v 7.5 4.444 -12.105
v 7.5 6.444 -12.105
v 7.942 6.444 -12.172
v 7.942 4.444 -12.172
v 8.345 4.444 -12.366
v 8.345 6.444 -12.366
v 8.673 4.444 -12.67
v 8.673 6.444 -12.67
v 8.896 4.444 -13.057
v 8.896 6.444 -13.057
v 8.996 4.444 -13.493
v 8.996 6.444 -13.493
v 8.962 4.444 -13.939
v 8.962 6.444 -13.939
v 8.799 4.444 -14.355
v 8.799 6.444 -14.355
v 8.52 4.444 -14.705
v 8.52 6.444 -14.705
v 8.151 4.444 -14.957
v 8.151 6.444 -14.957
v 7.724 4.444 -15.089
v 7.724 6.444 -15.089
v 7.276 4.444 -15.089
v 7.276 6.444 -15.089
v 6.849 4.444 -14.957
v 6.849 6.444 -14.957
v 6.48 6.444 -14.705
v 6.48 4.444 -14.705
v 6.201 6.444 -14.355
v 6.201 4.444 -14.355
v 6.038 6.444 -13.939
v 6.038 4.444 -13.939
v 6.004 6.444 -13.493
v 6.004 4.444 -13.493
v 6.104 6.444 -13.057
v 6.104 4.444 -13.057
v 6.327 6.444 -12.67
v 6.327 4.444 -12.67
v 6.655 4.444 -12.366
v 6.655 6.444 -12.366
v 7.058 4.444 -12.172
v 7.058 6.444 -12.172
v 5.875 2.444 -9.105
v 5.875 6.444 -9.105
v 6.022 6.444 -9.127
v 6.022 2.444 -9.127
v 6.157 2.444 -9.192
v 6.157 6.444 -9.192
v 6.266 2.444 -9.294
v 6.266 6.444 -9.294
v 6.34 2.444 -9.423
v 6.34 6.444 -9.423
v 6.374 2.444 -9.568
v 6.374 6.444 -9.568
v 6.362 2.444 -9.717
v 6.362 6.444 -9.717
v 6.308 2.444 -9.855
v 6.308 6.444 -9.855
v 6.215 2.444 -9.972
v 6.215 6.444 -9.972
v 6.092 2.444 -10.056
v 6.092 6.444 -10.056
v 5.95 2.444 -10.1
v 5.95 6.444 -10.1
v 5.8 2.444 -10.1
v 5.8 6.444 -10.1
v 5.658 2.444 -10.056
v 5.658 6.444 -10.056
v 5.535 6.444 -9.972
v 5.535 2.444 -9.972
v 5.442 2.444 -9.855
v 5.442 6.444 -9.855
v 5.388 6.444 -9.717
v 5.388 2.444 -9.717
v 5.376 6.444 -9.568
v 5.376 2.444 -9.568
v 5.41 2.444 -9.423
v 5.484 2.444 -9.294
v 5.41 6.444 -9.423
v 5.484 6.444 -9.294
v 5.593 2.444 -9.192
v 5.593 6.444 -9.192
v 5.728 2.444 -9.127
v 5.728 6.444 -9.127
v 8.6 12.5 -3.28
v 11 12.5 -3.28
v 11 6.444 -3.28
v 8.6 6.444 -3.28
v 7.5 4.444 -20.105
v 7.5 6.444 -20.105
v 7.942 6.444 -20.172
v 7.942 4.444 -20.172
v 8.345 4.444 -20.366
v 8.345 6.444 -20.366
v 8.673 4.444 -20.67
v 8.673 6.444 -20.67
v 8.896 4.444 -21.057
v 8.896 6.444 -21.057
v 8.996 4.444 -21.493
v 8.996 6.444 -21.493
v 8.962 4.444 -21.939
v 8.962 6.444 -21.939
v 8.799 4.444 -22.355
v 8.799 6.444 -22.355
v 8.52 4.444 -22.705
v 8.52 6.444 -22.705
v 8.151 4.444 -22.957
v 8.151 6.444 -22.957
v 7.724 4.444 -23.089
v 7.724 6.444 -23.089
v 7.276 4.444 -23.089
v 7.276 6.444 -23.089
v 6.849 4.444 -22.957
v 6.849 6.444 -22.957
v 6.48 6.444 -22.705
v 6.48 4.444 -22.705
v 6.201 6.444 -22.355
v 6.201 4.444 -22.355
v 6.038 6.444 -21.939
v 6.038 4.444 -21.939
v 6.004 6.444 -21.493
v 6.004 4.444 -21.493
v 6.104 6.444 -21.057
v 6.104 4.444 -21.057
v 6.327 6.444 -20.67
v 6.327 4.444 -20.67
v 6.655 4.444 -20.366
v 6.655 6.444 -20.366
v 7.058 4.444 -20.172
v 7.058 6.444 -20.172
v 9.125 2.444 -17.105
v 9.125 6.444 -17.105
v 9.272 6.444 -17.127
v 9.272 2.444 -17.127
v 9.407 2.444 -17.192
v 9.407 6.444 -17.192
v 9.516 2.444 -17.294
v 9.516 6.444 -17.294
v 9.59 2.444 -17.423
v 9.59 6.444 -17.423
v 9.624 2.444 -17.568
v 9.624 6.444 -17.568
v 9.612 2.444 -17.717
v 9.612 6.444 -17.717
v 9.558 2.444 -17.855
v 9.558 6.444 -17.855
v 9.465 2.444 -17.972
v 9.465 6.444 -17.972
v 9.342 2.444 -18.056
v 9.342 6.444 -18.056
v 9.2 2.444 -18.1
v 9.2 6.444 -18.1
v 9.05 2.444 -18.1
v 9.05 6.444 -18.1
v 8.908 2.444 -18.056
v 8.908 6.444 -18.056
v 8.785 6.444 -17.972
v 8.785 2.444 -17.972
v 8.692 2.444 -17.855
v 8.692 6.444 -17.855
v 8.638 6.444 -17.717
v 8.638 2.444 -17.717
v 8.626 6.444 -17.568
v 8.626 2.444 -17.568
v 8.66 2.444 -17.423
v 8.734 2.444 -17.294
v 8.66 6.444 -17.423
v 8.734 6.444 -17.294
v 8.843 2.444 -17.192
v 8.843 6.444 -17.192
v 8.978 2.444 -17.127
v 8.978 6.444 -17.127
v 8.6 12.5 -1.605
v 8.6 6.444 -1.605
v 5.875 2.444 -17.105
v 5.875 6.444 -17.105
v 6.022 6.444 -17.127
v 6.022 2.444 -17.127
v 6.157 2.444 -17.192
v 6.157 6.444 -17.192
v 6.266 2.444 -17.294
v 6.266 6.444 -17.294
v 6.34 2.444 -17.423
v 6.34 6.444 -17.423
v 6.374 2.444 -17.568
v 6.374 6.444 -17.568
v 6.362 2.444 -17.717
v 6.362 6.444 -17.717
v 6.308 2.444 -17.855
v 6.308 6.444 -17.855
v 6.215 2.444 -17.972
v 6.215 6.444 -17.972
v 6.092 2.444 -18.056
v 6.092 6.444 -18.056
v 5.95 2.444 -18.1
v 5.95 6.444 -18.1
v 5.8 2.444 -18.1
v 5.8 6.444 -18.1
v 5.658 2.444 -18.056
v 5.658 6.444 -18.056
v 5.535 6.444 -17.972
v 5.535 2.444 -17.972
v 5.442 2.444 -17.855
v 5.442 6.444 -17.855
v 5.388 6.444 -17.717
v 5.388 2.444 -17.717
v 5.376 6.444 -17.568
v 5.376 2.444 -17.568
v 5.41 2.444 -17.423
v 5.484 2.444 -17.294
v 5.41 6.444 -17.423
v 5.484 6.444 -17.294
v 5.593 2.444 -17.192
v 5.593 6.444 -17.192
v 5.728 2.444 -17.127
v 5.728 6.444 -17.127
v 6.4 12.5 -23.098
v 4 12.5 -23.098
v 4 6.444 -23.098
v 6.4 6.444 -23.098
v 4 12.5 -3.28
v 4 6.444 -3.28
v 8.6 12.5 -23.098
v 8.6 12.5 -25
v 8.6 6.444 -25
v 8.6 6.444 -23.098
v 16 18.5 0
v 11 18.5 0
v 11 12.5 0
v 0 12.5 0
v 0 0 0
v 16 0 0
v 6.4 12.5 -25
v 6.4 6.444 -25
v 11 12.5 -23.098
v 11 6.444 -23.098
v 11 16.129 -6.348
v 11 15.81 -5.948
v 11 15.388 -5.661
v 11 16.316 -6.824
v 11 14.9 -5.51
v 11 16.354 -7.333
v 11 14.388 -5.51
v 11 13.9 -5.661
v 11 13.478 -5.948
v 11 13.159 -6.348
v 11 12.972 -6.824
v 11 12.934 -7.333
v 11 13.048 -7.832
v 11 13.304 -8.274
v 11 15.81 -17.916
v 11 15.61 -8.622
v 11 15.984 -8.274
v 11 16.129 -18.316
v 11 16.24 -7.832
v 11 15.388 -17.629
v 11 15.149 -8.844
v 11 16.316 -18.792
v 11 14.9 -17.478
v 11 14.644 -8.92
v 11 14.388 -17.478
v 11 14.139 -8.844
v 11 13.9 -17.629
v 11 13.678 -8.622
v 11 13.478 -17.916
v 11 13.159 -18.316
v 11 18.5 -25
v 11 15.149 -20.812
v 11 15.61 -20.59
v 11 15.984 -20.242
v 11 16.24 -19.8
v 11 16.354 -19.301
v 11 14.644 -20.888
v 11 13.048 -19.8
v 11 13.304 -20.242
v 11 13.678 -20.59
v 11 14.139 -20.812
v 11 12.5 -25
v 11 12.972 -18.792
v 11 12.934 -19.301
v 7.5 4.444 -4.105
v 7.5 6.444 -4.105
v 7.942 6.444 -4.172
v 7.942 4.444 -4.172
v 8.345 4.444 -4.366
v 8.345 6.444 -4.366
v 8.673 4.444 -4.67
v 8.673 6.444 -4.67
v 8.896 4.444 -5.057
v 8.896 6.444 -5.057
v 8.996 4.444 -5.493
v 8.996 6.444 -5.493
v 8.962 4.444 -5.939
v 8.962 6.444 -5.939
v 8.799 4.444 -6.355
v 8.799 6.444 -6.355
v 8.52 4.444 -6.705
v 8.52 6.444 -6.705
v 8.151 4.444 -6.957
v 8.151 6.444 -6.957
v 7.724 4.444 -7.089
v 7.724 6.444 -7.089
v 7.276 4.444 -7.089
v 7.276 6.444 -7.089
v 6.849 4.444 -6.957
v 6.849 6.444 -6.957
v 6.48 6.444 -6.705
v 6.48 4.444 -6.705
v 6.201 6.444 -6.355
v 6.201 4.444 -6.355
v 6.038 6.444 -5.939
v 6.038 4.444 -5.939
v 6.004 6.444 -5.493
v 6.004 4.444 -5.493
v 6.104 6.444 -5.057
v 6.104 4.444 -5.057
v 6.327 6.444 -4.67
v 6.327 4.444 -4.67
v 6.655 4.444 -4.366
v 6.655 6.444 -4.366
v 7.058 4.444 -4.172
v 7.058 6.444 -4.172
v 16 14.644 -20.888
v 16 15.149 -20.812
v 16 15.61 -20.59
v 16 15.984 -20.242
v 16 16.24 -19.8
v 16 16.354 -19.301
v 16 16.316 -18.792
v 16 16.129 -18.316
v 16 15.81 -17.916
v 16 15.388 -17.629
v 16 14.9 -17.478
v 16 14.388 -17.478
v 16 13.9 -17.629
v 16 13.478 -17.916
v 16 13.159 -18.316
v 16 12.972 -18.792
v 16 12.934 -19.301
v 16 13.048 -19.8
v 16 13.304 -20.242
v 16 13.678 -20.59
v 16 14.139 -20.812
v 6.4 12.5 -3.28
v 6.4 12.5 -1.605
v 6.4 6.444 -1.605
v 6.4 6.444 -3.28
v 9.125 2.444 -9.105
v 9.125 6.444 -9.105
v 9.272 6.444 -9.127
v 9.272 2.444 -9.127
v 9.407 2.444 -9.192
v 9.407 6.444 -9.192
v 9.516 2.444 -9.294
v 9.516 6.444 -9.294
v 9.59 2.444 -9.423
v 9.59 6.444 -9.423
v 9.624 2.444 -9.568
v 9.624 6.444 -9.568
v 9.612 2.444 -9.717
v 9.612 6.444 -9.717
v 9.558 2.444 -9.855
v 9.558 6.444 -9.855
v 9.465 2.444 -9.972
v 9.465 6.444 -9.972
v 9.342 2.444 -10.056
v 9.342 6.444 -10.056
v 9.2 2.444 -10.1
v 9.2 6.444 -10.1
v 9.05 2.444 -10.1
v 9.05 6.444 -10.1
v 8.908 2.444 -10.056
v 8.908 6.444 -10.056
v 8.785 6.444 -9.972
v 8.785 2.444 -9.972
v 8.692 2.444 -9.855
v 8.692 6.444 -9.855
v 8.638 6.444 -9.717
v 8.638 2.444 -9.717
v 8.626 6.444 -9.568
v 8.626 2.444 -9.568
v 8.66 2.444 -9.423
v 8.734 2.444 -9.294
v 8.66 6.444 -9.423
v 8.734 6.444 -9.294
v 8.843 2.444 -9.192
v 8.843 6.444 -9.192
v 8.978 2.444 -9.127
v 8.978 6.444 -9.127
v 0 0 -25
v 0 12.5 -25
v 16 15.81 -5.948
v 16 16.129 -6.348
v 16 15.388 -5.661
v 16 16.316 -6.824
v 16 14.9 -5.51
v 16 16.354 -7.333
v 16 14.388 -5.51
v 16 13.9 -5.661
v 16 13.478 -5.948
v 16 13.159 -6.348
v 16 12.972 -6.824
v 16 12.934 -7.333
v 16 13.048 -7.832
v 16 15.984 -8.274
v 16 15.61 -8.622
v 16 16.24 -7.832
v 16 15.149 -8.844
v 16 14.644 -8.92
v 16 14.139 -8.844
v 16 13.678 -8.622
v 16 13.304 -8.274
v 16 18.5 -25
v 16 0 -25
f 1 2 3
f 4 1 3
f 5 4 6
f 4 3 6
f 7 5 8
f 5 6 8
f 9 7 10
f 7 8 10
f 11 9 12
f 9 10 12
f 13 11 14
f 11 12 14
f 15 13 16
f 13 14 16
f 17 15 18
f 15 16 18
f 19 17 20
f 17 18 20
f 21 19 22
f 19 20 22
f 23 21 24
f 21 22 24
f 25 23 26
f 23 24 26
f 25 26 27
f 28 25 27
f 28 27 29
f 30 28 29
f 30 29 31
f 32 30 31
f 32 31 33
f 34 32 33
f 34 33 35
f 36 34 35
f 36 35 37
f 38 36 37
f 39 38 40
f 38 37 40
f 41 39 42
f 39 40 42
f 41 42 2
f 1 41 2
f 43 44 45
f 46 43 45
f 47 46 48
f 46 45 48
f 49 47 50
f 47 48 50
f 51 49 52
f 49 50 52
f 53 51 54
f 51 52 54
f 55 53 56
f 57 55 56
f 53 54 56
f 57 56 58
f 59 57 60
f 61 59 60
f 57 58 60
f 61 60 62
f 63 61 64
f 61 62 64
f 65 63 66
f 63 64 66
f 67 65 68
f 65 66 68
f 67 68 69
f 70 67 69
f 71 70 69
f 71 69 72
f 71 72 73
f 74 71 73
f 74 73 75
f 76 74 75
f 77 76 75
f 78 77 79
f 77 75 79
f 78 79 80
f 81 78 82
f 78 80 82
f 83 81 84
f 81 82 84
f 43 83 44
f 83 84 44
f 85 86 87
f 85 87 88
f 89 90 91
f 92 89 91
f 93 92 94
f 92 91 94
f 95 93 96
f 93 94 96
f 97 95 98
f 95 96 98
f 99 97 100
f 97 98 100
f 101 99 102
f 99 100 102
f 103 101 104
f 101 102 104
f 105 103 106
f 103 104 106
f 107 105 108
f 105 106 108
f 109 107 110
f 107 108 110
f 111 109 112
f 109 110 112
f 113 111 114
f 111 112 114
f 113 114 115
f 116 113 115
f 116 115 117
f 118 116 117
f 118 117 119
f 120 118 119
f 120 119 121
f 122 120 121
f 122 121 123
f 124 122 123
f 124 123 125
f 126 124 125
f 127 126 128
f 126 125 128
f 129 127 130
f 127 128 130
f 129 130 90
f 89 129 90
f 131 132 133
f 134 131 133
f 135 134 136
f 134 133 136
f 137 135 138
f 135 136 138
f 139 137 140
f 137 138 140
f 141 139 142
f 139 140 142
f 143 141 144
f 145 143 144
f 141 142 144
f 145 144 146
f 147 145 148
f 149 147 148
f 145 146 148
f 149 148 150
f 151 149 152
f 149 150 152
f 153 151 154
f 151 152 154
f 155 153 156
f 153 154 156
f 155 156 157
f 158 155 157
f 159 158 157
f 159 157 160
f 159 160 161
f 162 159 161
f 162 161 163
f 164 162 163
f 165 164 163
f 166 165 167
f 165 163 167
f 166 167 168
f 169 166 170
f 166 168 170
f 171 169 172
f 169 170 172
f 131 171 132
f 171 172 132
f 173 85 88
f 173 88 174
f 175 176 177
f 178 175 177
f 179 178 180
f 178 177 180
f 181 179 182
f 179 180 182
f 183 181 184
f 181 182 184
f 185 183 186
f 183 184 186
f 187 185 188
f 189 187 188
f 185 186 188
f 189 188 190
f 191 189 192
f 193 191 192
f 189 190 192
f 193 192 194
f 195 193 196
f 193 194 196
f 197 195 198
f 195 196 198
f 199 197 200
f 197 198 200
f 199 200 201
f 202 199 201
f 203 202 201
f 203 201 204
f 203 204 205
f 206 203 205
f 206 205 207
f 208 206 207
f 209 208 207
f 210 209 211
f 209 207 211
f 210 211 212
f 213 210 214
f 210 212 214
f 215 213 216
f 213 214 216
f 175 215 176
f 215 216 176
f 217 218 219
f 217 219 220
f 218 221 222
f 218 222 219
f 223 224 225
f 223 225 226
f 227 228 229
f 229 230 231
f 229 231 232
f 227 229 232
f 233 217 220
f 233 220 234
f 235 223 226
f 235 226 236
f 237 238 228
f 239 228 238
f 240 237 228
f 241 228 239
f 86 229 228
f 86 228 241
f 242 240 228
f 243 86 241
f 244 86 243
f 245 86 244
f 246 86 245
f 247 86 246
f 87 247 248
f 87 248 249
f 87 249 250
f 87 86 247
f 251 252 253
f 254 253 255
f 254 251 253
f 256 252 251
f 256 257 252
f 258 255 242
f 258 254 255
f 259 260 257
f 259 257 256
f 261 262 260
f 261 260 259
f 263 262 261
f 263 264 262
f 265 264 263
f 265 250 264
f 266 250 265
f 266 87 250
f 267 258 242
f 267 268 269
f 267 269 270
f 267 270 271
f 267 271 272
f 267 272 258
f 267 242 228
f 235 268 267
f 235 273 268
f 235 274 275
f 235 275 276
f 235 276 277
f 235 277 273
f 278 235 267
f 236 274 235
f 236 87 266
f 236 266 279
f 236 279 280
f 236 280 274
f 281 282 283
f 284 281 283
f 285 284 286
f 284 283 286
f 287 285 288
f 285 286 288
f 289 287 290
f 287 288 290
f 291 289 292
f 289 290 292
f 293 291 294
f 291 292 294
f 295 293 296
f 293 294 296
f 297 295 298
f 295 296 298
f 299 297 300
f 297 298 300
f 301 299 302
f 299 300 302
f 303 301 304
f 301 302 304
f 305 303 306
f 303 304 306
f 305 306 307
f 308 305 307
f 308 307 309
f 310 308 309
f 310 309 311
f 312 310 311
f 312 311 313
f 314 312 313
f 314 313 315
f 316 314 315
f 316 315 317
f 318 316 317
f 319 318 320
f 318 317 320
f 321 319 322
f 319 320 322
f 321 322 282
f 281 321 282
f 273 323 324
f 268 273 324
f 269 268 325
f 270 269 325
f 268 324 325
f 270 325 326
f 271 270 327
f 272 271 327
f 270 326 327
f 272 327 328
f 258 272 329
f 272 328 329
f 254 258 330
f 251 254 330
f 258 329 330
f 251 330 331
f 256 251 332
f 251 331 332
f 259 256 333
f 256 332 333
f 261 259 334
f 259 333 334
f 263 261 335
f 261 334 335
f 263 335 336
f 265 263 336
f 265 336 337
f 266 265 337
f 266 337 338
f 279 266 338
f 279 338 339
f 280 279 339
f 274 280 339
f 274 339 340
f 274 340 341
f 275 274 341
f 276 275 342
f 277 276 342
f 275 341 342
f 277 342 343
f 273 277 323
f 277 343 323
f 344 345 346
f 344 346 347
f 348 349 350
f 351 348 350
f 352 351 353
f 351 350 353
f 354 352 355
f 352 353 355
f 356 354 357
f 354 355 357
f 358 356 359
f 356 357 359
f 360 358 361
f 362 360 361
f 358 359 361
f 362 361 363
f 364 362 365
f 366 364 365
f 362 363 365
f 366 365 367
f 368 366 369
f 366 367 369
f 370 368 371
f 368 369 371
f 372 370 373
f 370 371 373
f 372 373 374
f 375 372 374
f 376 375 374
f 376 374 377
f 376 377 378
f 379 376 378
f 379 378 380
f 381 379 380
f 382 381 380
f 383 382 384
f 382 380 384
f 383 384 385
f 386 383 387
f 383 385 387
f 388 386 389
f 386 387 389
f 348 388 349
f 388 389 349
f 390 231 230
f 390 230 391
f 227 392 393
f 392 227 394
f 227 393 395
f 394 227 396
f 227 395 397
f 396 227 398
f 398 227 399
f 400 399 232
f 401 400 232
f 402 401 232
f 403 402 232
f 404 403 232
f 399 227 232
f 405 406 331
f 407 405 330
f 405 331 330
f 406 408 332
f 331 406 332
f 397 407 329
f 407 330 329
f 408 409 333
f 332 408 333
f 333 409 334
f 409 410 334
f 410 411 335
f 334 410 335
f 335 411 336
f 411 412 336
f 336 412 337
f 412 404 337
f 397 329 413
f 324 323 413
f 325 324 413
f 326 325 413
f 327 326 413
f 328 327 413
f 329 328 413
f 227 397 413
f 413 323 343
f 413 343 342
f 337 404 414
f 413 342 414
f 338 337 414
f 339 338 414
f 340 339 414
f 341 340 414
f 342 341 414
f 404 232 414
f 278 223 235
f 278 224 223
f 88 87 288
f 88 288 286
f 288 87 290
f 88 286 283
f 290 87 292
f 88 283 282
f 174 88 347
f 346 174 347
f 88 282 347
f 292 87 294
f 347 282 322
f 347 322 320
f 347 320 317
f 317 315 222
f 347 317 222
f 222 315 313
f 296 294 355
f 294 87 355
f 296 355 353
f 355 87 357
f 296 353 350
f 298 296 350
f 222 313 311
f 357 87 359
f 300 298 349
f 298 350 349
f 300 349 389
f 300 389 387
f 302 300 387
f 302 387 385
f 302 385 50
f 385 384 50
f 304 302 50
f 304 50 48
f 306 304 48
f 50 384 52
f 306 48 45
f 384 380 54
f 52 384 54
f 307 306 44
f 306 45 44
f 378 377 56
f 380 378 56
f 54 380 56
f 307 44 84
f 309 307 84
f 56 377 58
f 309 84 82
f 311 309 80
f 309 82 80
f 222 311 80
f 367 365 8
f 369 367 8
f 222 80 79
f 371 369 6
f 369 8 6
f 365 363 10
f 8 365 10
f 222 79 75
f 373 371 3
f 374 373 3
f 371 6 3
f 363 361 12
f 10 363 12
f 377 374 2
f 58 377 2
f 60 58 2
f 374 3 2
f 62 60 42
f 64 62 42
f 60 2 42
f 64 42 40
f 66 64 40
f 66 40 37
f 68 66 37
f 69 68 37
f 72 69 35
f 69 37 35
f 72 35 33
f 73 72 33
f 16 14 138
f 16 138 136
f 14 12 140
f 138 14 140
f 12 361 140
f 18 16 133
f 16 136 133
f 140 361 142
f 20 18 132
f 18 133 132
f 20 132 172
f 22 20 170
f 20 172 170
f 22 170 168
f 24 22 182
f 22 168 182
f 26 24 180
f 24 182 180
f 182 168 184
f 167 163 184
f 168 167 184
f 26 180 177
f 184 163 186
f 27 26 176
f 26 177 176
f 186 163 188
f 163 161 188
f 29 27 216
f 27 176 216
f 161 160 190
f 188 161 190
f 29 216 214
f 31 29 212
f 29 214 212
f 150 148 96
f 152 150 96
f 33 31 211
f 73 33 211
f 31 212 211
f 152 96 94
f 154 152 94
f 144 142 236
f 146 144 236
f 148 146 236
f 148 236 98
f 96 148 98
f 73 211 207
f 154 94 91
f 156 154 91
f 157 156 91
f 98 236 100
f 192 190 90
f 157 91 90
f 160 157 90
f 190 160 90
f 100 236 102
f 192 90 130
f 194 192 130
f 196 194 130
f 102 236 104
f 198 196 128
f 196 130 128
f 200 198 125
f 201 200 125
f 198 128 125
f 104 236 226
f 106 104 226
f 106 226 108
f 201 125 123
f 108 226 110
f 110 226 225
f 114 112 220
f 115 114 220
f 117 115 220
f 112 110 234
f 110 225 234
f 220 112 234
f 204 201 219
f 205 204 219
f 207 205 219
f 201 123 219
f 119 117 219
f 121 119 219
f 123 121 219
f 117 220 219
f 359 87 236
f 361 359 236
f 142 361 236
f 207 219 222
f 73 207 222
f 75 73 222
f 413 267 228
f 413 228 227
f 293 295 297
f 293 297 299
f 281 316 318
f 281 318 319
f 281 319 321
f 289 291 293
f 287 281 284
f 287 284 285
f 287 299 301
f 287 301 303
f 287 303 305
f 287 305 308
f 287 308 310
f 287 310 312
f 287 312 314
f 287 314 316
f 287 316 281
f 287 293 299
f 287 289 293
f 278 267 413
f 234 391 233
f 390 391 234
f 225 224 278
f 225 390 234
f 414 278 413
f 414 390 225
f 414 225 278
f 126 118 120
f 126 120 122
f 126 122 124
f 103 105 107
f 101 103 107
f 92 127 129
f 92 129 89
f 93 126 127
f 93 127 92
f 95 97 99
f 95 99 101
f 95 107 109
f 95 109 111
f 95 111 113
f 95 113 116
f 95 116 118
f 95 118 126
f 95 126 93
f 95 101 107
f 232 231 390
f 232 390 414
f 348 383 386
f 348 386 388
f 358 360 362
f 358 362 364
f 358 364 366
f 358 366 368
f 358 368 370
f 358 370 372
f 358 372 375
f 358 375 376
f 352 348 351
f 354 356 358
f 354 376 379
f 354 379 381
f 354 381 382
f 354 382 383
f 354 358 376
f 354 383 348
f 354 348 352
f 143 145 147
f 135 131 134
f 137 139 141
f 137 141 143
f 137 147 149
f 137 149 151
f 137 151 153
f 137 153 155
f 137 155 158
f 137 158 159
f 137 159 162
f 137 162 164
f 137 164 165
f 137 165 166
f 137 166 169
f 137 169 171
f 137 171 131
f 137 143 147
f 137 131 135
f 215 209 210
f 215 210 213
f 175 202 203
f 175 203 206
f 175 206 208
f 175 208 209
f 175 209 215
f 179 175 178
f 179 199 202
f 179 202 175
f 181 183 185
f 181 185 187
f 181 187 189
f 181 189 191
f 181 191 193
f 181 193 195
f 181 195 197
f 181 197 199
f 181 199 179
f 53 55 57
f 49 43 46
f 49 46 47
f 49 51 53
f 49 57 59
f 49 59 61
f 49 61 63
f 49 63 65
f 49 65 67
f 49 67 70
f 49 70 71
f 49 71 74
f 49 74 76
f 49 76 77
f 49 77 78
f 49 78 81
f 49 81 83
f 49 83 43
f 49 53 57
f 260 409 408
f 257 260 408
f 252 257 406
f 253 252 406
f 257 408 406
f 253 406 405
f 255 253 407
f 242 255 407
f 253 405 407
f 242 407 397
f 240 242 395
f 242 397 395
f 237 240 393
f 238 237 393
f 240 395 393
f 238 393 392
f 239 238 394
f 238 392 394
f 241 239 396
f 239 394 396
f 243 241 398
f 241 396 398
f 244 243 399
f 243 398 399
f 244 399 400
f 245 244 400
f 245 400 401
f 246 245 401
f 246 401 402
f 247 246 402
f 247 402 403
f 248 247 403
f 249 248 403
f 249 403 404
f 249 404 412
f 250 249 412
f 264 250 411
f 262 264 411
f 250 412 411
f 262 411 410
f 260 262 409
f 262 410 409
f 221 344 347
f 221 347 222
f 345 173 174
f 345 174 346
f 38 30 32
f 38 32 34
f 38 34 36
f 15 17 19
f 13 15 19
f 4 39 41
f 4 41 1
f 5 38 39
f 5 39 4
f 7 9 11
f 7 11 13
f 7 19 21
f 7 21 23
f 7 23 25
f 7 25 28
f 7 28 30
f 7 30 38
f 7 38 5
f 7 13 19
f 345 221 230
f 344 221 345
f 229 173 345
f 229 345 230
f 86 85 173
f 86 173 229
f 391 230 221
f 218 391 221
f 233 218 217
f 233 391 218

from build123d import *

# Parameters (mm, degrees)
SKETCH1_W           = 16
SKETCH1_H           = 25
BOSS_EXTRUDE1_DEPTH = 12.5
CUT_EXTRUDE1_DEPTH  = 6.056
SKETCH4_W           = 5
SKETCH4_H           = 25
BOSS_EXTRUDE2_DEPTH = 6
SKETCH3_R           = 1.7145
CUT_EXTRUDE2_DEPTH  = 5
SKETCH6_R           = 0.5
CUT_EXTRUDE3_DEPTH  = 4
SKETCH7_R           = 1.5
CUT_EXTRUDE4_DEPTH  = 2


with BuildPart() as part:
    # Sketch1 → Boss-Extrude1 (new body)
    with BuildSketch(Plane(origin=(0, 0, 0), x_dir=(1, 0, 0), z_dir=(0, 1, 0))):
        with Locations((8, 12.5)):
            Rectangle(SKETCH1_W, SKETCH1_H)
    extrude(amount=BOSS_EXTRUDE1_DEPTH)

    # Sketch2 → Cut-Extrude1 (cut)
    with BuildSketch(Plane(origin=(0, 12.5, 0), x_dir=(1, 0, 0), z_dir=(0, 1, 0))):
        Polygon((4, 23.098280204), (6.4, 23.098280204), (6.4, 25), (8.6, 25), (8.6, 23.098280204), (11, 23.098280204), (11, 3.280280204), (8.6, 3.280280204), (8.6, 1.605280204), (6.4, 1.605280204), (6.4, 3.280280204), (4, 3.280280204), align=None)
    extrude(amount=-CUT_EXTRUDE1_DEPTH, mode=Mode.SUBTRACT)

    # Sketch4 → Boss-Extrude2 (add)
    with BuildSketch(Plane(origin=(0, 12.5, 0), x_dir=(1, 0, 0), z_dir=(0, 1, 0))):
        with Locations((13.5, 12.5)):
            Rectangle(SKETCH4_W, SKETCH4_H)
    extrude(amount=BOSS_EXTRUDE2_DEPTH)

    # Sketch3 → Cut-Extrude2 (cut)
    with BuildSketch(Plane(origin=(16, 0, 0), x_dir=(0, 0, -1), z_dir=(1, 0, 0))):
        with Locations((7.205280204, 14.644)):
            Circle(SKETCH3_R)
        with Locations((19.173280204, 14.644)):
            Circle(SKETCH3_R)
    extrude(amount=-CUT_EXTRUDE2_DEPTH, mode=Mode.SUBTRACT)

    # Sketch6 → Cut-Extrude3 (cut)
    with BuildSketch(Plane(origin=(0, 6.444, 0), x_dir=(1, 0, 0), z_dir=(0, 1, 0))):
        with Locations(Location((5.875, 9.605280204, 0), (0, 0, 270))):
            Circle(SKETCH6_R)
        with Locations(Location((9.125, 9.605280204, 0), (0, 0, 270))):
            Circle(SKETCH6_R)
        with Locations(Location((5.875, 17.605280204, 0), (0, 0, 270))):
            Circle(SKETCH6_R)
        with Locations(Location((9.125, 17.605280204, 0), (0, 0, 270))):
            Circle(SKETCH6_R)
    extrude(amount=-CUT_EXTRUDE3_DEPTH, mode=Mode.SUBTRACT)

    # Sketch7 → Cut-Extrude4 (cut)
    with BuildSketch(Plane(origin=(0, 6.444, 0), x_dir=(1, 0, 0), z_dir=(0, 1, 0))):
        with Locations(Location((7.5, 21.605280204, 0), (0, 0, 270))):
            Circle(SKETCH7_R)
        with Locations(Location((7.5, 13.605280204, 0), (0, 0, 270))):
            Circle(SKETCH7_R)
        with Locations(Location((7.5, 5.605280204, 0), (0, 0, 270))):
            Circle(SKETCH7_R)
    extrude(amount=-CUT_EXTRUDE4_DEPTH, mode=Mode.SUBTRACT)


solid = part.part
